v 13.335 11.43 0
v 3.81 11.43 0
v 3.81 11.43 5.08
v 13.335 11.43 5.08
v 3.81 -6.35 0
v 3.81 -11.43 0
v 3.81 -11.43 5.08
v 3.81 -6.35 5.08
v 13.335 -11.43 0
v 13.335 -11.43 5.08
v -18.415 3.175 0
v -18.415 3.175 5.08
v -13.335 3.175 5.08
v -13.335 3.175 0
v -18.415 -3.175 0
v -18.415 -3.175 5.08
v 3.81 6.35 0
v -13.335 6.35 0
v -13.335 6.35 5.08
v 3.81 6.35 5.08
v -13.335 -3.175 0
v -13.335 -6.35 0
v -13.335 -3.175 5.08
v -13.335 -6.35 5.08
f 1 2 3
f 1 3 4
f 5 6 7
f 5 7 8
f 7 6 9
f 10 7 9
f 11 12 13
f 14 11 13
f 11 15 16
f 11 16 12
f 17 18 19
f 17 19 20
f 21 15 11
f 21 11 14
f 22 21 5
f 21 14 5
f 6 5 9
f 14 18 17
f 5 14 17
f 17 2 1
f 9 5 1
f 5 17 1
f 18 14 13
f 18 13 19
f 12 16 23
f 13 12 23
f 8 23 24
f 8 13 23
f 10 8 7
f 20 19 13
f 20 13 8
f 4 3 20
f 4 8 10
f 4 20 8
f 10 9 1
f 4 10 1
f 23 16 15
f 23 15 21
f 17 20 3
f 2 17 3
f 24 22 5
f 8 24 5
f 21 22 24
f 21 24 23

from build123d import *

# Parameters (mm, degrees)
SKETCH1_W           = 5.08
SKETCH1_H           = 6.35
SKETCH1_W_2         = 26.67
SKETCH1_H_2         = 12.7
SKETCH1_W_3         = 9.525
SKETCH1_H_3         = 5.08
BOSS_EXTRUDE1_DEPTH = 5.08


with BuildPart() as part:
    # Sketch1 → Boss-Extrude1 (new body)
    with BuildSketch(Plane.XY):
        with Locations((-15.875, 0)):
            Rectangle(SKETCH1_W, SKETCH1_H)
        Rectangle(SKETCH1_W_2, SKETCH1_H_2)
        with Locations((8.5725, 8.89)):
            Rectangle(SKETCH1_W_3, SKETCH1_H_3)
        with Locations((8.5725, -8.89)):
            Rectangle(SKETCH1_W_3, SKETCH1_H_3)
    extrude(amount=BOSS_EXTRUDE1_DEPTH)


solid = part.part
